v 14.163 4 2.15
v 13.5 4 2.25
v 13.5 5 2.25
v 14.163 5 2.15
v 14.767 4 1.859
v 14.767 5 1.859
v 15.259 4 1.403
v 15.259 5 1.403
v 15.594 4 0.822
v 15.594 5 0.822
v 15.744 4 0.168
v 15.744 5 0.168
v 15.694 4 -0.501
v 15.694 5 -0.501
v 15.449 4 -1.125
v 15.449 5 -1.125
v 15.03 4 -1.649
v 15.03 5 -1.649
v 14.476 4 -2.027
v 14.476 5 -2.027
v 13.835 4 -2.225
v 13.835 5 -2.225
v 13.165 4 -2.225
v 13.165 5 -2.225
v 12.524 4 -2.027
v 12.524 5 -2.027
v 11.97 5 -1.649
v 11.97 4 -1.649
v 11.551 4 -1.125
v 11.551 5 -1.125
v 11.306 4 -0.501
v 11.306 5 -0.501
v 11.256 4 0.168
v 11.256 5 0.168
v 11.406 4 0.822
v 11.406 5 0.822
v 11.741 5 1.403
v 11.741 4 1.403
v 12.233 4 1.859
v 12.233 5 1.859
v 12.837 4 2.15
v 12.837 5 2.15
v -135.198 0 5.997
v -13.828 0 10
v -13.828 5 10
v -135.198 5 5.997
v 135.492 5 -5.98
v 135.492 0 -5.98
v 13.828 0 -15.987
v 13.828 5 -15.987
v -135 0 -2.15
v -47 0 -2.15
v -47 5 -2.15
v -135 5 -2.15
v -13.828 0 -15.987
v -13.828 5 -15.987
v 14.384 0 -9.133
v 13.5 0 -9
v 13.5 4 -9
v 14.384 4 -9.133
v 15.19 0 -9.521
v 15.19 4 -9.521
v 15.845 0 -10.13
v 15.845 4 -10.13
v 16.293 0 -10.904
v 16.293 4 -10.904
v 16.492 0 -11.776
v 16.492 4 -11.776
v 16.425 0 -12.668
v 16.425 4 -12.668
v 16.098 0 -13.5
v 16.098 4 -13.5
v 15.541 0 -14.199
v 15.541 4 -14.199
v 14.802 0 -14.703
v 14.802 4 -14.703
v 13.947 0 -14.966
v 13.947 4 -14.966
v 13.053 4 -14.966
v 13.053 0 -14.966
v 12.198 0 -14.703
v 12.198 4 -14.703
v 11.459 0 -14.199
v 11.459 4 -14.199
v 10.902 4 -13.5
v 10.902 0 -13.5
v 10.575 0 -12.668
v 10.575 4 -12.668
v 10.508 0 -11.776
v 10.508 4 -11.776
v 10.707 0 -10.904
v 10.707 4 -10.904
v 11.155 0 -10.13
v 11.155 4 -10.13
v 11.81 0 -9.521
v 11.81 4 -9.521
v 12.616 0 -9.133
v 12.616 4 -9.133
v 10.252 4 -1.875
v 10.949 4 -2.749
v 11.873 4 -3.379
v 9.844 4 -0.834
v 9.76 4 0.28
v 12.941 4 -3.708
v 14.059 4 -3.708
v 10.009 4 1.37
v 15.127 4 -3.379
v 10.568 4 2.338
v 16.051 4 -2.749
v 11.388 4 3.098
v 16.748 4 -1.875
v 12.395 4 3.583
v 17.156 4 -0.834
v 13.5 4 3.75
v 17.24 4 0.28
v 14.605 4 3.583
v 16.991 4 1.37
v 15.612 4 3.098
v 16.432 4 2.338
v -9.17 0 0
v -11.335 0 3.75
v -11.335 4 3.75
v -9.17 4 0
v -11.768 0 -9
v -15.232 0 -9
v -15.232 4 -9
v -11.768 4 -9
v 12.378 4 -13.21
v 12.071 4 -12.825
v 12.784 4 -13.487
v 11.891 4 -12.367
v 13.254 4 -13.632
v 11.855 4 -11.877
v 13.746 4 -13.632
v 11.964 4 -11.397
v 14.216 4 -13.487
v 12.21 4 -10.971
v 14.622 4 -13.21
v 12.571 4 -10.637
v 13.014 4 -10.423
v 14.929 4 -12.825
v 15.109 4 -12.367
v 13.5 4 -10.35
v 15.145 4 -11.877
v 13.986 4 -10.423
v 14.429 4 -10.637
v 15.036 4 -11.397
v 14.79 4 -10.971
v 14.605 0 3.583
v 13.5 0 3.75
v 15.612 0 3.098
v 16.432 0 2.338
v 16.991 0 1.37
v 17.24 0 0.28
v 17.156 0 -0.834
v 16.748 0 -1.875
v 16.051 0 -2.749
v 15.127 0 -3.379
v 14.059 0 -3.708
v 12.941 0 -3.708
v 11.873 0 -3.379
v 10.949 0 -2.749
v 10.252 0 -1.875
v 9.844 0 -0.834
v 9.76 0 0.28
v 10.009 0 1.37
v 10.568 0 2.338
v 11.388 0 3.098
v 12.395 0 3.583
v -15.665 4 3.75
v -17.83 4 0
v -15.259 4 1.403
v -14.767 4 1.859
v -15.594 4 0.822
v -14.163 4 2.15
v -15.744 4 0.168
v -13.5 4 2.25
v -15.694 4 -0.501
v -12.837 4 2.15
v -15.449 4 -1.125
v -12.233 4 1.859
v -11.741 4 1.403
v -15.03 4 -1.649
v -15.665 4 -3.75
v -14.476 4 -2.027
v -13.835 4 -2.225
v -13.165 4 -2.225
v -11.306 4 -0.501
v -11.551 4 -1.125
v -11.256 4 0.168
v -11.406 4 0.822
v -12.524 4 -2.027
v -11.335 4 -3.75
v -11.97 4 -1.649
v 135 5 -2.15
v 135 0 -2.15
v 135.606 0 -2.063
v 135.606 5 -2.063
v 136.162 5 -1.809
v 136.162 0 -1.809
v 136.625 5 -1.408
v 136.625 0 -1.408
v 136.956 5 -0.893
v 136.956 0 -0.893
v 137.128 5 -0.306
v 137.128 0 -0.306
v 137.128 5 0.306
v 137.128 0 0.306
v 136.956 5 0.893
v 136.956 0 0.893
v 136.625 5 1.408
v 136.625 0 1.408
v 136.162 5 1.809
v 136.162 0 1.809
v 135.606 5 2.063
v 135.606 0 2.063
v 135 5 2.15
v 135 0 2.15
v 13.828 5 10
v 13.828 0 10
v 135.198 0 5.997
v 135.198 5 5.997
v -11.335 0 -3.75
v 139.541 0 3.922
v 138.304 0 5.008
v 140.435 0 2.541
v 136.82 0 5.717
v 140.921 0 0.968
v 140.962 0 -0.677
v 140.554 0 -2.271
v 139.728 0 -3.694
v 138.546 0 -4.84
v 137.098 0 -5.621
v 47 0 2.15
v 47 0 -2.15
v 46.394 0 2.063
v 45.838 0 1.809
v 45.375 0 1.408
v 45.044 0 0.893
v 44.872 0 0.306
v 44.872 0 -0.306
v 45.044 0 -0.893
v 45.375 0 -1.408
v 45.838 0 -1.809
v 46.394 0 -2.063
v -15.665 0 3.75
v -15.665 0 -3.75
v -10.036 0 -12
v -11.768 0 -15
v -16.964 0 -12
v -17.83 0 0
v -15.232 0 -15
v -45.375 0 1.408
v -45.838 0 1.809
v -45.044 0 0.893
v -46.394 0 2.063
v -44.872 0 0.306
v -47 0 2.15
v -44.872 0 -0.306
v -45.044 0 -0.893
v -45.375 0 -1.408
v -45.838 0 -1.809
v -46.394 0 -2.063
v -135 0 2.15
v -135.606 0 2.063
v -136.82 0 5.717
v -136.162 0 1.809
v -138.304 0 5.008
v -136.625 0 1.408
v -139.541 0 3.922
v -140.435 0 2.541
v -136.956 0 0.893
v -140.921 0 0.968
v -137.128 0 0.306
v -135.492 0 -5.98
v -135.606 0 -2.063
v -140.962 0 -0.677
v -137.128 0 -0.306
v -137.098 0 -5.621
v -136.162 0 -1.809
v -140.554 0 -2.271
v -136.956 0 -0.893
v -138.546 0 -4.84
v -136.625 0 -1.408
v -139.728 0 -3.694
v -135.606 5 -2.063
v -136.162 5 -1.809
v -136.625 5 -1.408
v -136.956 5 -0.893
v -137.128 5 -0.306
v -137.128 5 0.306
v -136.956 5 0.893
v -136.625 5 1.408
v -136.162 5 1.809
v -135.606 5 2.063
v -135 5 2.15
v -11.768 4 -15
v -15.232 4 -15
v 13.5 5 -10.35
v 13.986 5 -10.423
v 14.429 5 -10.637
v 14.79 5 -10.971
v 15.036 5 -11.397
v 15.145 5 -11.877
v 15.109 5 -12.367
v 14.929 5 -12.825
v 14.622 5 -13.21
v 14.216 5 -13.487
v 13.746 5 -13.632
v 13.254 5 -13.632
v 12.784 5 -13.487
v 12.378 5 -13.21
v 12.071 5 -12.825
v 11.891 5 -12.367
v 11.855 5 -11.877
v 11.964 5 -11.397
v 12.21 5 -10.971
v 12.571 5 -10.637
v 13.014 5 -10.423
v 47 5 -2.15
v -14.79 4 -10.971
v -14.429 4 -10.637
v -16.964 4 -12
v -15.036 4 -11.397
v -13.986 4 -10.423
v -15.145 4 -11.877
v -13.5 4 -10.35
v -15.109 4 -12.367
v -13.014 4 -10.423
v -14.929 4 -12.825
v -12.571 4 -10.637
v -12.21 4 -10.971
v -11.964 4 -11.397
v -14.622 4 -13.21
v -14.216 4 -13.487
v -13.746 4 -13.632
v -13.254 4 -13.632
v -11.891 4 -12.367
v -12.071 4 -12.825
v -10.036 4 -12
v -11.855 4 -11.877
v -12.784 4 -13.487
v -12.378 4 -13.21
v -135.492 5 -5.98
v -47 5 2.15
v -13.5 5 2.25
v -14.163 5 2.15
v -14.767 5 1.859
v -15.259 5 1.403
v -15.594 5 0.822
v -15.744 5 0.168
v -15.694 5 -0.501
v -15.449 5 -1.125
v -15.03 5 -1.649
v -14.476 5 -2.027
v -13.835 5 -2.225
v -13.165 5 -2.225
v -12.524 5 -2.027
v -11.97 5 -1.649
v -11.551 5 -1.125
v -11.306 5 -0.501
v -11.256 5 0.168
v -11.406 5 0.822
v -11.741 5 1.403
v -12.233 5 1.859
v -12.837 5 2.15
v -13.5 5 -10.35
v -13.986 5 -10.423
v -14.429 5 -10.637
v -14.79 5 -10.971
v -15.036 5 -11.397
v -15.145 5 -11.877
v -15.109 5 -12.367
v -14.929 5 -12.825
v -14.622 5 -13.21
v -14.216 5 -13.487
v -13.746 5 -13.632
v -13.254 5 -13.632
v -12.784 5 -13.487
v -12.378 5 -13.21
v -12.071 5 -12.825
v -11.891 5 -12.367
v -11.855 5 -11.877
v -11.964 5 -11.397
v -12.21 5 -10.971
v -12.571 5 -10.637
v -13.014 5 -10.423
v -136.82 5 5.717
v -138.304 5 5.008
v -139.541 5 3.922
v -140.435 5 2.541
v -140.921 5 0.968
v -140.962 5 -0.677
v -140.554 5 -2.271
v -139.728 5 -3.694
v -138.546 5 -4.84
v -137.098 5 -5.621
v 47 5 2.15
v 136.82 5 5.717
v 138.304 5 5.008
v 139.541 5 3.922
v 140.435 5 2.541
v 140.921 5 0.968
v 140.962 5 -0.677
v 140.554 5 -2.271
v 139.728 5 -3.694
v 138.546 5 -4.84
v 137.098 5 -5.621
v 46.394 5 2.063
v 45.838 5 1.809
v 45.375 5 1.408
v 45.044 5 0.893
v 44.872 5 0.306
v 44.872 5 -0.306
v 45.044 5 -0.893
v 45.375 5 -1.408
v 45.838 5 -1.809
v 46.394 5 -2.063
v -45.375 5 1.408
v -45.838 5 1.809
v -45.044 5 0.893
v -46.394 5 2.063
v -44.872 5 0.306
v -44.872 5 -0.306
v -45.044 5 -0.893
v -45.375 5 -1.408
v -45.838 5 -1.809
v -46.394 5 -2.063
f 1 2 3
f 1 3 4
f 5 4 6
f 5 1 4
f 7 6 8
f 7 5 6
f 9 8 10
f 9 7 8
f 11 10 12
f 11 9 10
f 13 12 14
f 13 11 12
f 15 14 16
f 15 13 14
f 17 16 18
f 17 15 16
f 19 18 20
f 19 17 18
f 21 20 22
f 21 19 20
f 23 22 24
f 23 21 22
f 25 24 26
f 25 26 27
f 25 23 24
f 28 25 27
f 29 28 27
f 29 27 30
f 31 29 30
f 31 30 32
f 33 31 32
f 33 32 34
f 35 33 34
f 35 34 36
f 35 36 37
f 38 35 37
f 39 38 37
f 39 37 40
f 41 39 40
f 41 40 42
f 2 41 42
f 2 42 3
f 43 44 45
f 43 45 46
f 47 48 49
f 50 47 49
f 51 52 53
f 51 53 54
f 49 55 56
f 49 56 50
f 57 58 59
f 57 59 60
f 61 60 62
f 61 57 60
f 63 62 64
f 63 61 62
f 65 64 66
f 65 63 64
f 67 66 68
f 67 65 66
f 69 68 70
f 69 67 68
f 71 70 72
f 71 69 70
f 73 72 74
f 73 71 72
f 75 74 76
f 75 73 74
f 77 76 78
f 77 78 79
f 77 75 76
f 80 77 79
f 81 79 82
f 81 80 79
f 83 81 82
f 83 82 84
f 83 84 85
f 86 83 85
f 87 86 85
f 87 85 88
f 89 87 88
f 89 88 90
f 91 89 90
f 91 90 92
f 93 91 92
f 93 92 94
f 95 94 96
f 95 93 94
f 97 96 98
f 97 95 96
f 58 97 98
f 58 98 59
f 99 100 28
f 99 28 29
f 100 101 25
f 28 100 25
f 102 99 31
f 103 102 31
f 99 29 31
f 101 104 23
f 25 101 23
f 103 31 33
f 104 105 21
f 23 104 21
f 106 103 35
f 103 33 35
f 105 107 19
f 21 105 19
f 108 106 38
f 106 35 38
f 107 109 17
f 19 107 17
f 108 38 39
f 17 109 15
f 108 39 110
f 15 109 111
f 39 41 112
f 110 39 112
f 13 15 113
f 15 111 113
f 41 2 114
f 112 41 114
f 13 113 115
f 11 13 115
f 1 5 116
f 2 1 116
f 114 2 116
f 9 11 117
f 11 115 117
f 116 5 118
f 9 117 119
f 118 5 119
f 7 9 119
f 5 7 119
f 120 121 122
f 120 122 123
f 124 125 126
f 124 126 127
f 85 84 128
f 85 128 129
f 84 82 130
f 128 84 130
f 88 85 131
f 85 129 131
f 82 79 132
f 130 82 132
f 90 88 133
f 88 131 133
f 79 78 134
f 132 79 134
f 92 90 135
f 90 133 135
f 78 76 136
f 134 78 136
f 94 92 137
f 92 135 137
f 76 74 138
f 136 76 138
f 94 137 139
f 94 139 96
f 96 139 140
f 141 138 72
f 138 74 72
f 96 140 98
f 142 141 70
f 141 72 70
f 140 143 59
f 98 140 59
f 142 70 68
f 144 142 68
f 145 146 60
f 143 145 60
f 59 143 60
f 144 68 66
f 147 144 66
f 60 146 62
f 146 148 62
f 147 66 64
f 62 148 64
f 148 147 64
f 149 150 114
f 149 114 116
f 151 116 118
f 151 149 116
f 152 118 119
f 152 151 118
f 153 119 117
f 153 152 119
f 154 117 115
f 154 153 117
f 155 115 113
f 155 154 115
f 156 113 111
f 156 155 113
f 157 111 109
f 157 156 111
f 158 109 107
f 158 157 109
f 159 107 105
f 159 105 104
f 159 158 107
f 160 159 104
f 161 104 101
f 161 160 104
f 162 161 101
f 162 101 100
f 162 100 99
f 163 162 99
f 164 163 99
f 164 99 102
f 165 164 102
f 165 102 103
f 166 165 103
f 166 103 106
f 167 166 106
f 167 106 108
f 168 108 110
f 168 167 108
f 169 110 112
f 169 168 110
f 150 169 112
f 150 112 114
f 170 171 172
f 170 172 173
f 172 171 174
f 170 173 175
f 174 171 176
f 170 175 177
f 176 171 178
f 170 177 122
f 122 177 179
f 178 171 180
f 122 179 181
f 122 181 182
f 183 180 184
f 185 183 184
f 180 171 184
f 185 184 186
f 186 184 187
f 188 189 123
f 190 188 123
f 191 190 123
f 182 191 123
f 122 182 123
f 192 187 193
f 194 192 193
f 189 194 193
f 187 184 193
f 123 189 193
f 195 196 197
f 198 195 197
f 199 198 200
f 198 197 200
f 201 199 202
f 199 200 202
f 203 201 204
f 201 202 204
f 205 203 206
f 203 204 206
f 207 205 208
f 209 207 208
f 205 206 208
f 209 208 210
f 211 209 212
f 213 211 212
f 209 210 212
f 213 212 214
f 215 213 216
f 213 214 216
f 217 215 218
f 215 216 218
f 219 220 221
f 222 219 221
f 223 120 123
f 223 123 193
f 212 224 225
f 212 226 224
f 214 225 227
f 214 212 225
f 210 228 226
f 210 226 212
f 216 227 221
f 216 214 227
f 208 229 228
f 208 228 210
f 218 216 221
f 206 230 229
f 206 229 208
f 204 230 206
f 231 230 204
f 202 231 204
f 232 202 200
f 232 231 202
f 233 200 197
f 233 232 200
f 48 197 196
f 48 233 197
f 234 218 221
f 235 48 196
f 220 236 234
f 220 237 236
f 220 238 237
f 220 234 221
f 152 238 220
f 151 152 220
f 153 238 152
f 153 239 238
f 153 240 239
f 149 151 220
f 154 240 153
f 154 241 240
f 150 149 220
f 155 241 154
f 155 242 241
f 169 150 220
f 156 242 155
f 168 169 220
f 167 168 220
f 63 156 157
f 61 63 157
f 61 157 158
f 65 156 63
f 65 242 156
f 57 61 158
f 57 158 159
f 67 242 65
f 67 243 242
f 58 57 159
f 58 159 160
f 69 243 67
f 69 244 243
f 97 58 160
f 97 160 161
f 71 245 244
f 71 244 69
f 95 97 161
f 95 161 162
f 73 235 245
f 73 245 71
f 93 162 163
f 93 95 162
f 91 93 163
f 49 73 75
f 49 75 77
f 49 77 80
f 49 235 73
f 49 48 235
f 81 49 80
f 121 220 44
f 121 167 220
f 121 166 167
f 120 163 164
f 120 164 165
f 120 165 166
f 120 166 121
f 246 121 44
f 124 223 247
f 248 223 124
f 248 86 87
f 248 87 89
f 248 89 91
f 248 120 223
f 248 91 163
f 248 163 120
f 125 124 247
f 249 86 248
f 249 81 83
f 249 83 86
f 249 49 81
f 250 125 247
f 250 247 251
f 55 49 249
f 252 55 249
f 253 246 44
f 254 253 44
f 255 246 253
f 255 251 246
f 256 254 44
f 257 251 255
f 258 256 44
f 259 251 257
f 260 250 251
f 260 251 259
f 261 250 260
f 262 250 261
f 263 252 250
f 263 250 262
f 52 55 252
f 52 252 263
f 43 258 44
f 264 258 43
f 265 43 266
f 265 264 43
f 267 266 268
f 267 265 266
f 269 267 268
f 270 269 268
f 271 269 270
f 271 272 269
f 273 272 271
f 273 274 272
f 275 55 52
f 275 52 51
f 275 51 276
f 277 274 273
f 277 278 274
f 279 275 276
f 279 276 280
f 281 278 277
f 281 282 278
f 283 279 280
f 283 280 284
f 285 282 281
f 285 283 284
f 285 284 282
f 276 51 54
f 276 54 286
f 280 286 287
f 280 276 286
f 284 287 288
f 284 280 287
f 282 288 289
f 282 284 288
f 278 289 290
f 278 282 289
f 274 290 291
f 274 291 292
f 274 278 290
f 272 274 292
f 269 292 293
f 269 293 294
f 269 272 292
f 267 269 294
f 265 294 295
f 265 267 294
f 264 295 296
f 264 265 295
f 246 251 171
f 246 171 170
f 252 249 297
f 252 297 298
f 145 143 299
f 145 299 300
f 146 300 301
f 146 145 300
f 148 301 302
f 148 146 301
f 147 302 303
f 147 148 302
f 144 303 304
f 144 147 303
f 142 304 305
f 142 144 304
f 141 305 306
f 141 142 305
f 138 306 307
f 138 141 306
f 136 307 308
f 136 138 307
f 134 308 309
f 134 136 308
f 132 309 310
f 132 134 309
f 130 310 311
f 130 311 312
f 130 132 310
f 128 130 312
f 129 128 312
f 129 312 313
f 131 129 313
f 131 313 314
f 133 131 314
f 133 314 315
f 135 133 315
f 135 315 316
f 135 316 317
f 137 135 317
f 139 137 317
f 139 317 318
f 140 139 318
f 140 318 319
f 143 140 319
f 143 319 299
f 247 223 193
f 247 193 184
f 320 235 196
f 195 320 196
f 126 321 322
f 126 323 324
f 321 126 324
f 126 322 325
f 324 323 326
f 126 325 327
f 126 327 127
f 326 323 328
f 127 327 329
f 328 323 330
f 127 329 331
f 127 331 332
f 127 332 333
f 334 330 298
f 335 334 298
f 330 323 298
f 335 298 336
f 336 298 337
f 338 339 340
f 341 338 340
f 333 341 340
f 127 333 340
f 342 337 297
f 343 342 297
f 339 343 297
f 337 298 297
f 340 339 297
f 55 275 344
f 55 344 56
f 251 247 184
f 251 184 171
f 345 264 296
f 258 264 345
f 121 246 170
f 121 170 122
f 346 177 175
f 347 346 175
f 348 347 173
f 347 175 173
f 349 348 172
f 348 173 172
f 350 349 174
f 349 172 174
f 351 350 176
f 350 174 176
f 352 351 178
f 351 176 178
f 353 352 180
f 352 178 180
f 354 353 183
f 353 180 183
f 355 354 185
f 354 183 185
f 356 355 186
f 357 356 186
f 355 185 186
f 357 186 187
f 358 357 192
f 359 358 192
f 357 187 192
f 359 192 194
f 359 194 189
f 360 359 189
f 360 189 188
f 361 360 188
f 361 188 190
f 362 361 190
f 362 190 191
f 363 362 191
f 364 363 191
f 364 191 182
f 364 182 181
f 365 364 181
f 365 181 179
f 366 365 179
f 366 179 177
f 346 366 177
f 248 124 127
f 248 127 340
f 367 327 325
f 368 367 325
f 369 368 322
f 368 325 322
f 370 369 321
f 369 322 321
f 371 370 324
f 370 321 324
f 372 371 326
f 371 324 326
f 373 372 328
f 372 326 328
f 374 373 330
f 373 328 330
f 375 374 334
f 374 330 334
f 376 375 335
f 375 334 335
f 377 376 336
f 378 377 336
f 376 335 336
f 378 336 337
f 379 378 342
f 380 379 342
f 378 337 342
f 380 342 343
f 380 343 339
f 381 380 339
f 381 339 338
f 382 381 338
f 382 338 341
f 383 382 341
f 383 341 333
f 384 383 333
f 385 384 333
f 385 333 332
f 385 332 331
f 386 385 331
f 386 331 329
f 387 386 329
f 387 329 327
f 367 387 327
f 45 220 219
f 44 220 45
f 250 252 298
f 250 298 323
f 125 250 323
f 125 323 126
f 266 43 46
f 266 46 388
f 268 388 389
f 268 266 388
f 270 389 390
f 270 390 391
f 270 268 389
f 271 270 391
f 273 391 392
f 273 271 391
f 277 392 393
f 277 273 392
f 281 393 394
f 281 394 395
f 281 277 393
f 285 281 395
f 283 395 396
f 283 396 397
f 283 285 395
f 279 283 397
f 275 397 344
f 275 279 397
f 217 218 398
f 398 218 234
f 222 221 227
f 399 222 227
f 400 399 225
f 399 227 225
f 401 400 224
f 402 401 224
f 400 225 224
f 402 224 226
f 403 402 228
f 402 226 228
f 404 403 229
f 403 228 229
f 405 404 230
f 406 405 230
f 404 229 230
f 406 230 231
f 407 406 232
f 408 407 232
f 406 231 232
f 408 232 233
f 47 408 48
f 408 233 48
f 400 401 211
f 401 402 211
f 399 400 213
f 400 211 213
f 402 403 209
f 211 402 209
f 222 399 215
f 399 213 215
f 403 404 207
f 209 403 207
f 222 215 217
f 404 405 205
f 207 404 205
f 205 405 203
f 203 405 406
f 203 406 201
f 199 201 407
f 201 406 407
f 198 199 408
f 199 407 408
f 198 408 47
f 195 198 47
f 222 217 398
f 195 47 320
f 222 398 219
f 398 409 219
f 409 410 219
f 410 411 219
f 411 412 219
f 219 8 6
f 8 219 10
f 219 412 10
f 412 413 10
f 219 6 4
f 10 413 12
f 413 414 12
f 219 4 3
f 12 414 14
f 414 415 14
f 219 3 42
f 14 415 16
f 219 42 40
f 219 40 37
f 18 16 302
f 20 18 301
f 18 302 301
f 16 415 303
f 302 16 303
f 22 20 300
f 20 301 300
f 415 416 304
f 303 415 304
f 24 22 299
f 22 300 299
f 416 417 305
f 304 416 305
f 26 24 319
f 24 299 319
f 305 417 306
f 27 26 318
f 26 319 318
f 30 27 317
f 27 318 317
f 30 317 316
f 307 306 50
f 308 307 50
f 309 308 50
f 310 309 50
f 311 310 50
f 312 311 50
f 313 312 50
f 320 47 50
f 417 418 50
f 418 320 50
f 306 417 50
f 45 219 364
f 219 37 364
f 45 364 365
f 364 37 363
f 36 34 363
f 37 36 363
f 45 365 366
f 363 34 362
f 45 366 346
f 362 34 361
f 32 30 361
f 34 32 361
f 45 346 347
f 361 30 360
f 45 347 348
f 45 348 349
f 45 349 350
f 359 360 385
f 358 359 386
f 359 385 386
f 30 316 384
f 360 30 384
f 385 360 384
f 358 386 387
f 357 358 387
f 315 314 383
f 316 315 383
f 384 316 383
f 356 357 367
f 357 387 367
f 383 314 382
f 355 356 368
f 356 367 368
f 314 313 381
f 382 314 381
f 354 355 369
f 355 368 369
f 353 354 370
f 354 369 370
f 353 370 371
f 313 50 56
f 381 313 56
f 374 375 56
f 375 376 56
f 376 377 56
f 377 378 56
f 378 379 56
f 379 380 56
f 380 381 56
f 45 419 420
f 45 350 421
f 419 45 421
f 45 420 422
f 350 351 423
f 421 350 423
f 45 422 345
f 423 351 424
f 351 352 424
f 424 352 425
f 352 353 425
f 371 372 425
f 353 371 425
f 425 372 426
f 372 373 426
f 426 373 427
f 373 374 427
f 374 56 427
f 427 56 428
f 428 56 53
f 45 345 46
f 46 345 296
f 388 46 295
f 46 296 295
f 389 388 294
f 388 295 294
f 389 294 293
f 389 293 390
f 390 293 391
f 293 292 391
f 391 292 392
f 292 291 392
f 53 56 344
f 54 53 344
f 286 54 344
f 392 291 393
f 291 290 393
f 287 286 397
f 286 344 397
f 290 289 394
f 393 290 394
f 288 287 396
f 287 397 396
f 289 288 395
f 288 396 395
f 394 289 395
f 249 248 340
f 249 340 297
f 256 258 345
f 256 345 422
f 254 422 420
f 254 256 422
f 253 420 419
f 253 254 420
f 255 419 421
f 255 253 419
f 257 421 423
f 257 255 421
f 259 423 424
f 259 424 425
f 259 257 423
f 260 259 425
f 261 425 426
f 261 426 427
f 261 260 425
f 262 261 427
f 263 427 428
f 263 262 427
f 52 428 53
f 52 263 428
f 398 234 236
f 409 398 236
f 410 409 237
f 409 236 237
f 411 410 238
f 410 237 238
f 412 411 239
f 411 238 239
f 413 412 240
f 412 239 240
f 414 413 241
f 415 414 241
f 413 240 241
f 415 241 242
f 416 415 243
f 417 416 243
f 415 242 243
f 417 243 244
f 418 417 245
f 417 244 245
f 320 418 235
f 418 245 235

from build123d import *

# Parameters (mm, degrees)
SKETCH1_R           = 2.25
SKETCH1_R_2         = 1.65
BOSS_EXTRUDE1_DEPTH = 5
SKETCH3_R           = 3.75
SKETCH3_R_2         = 3
CUT_EXTRUDE1_DEPTH  = 4


with BuildPart() as part:
    # Sketch1 → Boss-Extrude1 (new body)
    with BuildSketch(Plane(origin=(0, 0, 0), x_dir=(1, 0, 0), z_dir=(0, 1, 0))):
        with BuildLine():
            Line((0, 15.986538484), (0, -10))
            Line((0, -10), (13.827888575, -10))
            Line((13.827888575, -10), (135.197796243, -5.996738834))
            ThreePointArc((135.197796243, -5.996738834), (140.998192557, -0.147261838), (135.491832862, 5.979807726))
            Line((135.491832862, 5.979807726), (13.827888575, 15.986538484))
            Line((13.827888575, 15.986538484), (0, 15.986538484))
        make_face()
        with Locations(Location((13.5, 0, 0), (0, 0, 270))):
            Circle(SKETCH1_R, mode=Mode.SUBTRACT)
        with BuildLine():
            ThreePointArc((47, -2.15), (44.85, 0), (47, 2.15))
            Line((47, 2.15), (135, 2.15))
            ThreePointArc((135, 2.15), (137.15, 0), (135, -2.15))
            Line((135, -2.15), (47, -2.15))
        make_face(mode=Mode.SUBTRACT)
        with Locations(Location((13.5, 12, 0), (0, 0, 270))):
            Circle(SKETCH1_R_2, mode=Mode.SUBTRACT)
    extrude(amount=BOSS_EXTRUDE1_DEPTH)

    # Mirror1: part across plane


with BuildPart() as part_1:
    add(part.part)
    add(part.part.mirror(Plane(origin=(0, 0, 0), x_dir=(0, 0, 1), z_dir=(1, 0, 0))))

    # Sketch3 → Cut-Extrude1 (cut)
    with BuildSketch(Plane(origin=(0, 0, 0), x_dir=(1, 0, 0), z_dir=(0, 1, 0))):
        with Locations(Location((13.5, 0, 0), (0, 0, 270))):
            Circle(SKETCH3_R)
        with Locations(Location((13.5, 12, 0), (0, 0, 270))):
            Circle(SKETCH3_R_2)
        Polygon((-9.169872981, 0), (-11.334936491, 3.75), (-15.665063509, 3.75), (-17.830127019, 0), (-15.665063509, -3.75), (-11.334936491, -3.75), align=None)
        Polygon((-10.035898385, 12), (-11.767949192, 15), (-15.232050808, 15), (-16.964101615, 12), (-15.232050808, 9), (-11.767949192, 9), align=None)
    extrude(amount=CUT_EXTRUDE1_DEPTH, mode=Mode.SUBTRACT)


solid = part_1.part
